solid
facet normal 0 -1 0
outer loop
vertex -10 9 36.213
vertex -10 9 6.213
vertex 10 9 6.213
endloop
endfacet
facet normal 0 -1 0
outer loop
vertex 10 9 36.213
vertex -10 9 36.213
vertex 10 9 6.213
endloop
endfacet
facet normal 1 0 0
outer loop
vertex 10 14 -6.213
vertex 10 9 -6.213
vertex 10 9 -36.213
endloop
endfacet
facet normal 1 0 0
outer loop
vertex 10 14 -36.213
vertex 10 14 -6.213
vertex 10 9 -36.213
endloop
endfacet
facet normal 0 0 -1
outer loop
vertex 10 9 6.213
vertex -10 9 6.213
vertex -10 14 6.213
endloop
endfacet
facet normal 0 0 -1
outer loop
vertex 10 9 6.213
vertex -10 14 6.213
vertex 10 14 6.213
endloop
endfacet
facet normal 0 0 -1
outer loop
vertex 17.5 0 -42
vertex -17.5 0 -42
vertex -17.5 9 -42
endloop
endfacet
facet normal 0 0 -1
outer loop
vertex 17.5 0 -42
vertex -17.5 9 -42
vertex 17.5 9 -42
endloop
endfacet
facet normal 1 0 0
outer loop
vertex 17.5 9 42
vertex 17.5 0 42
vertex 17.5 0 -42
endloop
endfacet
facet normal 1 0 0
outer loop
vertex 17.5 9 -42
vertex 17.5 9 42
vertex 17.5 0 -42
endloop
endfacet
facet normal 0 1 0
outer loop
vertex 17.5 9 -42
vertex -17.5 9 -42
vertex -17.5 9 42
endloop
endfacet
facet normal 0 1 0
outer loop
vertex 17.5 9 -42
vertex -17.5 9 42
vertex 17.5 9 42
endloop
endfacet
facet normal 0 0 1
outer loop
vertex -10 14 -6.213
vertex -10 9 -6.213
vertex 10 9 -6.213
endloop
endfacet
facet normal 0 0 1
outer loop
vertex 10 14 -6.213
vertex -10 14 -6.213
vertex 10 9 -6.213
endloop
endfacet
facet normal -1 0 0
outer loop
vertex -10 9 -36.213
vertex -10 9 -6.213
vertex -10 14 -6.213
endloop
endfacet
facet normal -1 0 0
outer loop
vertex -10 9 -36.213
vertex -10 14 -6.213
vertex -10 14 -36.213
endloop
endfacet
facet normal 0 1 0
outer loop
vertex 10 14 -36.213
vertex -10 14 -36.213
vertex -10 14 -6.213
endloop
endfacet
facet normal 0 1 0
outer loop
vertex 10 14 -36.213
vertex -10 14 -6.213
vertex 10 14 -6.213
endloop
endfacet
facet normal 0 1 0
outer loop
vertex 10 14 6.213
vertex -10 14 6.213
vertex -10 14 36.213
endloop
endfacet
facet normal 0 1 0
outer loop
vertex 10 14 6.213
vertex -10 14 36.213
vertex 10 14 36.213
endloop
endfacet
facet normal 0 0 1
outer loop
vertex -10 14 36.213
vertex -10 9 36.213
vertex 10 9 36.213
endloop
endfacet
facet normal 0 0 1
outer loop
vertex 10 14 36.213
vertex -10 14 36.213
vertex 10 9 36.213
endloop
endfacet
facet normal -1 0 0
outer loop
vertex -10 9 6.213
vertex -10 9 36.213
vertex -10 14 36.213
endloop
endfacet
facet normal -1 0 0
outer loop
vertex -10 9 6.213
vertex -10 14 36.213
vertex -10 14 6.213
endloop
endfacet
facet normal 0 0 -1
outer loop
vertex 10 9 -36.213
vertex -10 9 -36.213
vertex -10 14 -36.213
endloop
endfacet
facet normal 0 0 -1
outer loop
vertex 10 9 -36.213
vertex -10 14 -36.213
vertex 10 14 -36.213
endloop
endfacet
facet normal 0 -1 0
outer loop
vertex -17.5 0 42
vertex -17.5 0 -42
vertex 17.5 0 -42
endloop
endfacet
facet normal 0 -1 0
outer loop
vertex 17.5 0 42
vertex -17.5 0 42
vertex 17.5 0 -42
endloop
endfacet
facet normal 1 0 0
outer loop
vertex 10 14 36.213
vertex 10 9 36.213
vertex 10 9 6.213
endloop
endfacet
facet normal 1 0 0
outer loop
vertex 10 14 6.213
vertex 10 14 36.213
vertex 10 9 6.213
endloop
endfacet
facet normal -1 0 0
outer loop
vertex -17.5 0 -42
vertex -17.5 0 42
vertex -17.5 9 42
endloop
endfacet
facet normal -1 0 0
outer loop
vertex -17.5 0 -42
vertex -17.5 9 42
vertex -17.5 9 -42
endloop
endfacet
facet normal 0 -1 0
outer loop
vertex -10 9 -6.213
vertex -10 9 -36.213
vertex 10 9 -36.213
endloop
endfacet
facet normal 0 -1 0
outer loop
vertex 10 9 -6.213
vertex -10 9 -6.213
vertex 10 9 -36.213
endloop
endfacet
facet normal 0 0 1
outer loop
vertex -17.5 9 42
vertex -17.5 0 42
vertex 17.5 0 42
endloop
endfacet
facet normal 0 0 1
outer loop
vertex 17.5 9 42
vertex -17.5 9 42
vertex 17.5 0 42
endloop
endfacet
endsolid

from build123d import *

# Parameters (mm, degrees)
SKETCH1_W             = 35
SKETCH1_H             = 84
BOSS_EXTRUDE1_DEPTH   = 9
SKETCH2_W             = 20
SKETCH2_H             = 30
BOSS_EXTRUDE2_DEPTH   = 5
BOSS_EXTRUDE2_2_DEPTH = 5


with BuildPart() as part:
    # Sketch1 → Boss-Extrude1 (new body)
    with BuildSketch(Plane(origin=(0, 0, 0), x_dir=(1, 0, 0), z_dir=(0, 1, 0))):
        Rectangle(SKETCH1_W, SKETCH1_H)
    extrude(amount=BOSS_EXTRUDE1_DEPTH)


with BuildPart() as body_2:
    # Sketch2 → Boss-Extrude2 (new body)
    with BuildSketch(Plane(origin=(0, 9, 0), x_dir=(1, 0, 0), z_dir=(0, 1, 0))):
        with Locations((0, 21.213224671)):
            Rectangle(SKETCH2_W, SKETCH2_H)
    extrude(amount=BOSS_EXTRUDE2_DEPTH)


with BuildPart() as body_3:
    # Sketch2 → Boss-Extrude2 2 (new body)
    with BuildSketch(Plane(origin=(0, 9, 0), x_dir=(1, 0, 0), z_dir=(0, 1, 0))):
        with Locations((0, -21.213224671)):
            Rectangle(SKETCH2_W, SKETCH2_H)
    extrude(amount=BOSS_EXTRUDE2_2_DEPTH)


solid = Compound([part.part, body_2.part, body_3.part])
